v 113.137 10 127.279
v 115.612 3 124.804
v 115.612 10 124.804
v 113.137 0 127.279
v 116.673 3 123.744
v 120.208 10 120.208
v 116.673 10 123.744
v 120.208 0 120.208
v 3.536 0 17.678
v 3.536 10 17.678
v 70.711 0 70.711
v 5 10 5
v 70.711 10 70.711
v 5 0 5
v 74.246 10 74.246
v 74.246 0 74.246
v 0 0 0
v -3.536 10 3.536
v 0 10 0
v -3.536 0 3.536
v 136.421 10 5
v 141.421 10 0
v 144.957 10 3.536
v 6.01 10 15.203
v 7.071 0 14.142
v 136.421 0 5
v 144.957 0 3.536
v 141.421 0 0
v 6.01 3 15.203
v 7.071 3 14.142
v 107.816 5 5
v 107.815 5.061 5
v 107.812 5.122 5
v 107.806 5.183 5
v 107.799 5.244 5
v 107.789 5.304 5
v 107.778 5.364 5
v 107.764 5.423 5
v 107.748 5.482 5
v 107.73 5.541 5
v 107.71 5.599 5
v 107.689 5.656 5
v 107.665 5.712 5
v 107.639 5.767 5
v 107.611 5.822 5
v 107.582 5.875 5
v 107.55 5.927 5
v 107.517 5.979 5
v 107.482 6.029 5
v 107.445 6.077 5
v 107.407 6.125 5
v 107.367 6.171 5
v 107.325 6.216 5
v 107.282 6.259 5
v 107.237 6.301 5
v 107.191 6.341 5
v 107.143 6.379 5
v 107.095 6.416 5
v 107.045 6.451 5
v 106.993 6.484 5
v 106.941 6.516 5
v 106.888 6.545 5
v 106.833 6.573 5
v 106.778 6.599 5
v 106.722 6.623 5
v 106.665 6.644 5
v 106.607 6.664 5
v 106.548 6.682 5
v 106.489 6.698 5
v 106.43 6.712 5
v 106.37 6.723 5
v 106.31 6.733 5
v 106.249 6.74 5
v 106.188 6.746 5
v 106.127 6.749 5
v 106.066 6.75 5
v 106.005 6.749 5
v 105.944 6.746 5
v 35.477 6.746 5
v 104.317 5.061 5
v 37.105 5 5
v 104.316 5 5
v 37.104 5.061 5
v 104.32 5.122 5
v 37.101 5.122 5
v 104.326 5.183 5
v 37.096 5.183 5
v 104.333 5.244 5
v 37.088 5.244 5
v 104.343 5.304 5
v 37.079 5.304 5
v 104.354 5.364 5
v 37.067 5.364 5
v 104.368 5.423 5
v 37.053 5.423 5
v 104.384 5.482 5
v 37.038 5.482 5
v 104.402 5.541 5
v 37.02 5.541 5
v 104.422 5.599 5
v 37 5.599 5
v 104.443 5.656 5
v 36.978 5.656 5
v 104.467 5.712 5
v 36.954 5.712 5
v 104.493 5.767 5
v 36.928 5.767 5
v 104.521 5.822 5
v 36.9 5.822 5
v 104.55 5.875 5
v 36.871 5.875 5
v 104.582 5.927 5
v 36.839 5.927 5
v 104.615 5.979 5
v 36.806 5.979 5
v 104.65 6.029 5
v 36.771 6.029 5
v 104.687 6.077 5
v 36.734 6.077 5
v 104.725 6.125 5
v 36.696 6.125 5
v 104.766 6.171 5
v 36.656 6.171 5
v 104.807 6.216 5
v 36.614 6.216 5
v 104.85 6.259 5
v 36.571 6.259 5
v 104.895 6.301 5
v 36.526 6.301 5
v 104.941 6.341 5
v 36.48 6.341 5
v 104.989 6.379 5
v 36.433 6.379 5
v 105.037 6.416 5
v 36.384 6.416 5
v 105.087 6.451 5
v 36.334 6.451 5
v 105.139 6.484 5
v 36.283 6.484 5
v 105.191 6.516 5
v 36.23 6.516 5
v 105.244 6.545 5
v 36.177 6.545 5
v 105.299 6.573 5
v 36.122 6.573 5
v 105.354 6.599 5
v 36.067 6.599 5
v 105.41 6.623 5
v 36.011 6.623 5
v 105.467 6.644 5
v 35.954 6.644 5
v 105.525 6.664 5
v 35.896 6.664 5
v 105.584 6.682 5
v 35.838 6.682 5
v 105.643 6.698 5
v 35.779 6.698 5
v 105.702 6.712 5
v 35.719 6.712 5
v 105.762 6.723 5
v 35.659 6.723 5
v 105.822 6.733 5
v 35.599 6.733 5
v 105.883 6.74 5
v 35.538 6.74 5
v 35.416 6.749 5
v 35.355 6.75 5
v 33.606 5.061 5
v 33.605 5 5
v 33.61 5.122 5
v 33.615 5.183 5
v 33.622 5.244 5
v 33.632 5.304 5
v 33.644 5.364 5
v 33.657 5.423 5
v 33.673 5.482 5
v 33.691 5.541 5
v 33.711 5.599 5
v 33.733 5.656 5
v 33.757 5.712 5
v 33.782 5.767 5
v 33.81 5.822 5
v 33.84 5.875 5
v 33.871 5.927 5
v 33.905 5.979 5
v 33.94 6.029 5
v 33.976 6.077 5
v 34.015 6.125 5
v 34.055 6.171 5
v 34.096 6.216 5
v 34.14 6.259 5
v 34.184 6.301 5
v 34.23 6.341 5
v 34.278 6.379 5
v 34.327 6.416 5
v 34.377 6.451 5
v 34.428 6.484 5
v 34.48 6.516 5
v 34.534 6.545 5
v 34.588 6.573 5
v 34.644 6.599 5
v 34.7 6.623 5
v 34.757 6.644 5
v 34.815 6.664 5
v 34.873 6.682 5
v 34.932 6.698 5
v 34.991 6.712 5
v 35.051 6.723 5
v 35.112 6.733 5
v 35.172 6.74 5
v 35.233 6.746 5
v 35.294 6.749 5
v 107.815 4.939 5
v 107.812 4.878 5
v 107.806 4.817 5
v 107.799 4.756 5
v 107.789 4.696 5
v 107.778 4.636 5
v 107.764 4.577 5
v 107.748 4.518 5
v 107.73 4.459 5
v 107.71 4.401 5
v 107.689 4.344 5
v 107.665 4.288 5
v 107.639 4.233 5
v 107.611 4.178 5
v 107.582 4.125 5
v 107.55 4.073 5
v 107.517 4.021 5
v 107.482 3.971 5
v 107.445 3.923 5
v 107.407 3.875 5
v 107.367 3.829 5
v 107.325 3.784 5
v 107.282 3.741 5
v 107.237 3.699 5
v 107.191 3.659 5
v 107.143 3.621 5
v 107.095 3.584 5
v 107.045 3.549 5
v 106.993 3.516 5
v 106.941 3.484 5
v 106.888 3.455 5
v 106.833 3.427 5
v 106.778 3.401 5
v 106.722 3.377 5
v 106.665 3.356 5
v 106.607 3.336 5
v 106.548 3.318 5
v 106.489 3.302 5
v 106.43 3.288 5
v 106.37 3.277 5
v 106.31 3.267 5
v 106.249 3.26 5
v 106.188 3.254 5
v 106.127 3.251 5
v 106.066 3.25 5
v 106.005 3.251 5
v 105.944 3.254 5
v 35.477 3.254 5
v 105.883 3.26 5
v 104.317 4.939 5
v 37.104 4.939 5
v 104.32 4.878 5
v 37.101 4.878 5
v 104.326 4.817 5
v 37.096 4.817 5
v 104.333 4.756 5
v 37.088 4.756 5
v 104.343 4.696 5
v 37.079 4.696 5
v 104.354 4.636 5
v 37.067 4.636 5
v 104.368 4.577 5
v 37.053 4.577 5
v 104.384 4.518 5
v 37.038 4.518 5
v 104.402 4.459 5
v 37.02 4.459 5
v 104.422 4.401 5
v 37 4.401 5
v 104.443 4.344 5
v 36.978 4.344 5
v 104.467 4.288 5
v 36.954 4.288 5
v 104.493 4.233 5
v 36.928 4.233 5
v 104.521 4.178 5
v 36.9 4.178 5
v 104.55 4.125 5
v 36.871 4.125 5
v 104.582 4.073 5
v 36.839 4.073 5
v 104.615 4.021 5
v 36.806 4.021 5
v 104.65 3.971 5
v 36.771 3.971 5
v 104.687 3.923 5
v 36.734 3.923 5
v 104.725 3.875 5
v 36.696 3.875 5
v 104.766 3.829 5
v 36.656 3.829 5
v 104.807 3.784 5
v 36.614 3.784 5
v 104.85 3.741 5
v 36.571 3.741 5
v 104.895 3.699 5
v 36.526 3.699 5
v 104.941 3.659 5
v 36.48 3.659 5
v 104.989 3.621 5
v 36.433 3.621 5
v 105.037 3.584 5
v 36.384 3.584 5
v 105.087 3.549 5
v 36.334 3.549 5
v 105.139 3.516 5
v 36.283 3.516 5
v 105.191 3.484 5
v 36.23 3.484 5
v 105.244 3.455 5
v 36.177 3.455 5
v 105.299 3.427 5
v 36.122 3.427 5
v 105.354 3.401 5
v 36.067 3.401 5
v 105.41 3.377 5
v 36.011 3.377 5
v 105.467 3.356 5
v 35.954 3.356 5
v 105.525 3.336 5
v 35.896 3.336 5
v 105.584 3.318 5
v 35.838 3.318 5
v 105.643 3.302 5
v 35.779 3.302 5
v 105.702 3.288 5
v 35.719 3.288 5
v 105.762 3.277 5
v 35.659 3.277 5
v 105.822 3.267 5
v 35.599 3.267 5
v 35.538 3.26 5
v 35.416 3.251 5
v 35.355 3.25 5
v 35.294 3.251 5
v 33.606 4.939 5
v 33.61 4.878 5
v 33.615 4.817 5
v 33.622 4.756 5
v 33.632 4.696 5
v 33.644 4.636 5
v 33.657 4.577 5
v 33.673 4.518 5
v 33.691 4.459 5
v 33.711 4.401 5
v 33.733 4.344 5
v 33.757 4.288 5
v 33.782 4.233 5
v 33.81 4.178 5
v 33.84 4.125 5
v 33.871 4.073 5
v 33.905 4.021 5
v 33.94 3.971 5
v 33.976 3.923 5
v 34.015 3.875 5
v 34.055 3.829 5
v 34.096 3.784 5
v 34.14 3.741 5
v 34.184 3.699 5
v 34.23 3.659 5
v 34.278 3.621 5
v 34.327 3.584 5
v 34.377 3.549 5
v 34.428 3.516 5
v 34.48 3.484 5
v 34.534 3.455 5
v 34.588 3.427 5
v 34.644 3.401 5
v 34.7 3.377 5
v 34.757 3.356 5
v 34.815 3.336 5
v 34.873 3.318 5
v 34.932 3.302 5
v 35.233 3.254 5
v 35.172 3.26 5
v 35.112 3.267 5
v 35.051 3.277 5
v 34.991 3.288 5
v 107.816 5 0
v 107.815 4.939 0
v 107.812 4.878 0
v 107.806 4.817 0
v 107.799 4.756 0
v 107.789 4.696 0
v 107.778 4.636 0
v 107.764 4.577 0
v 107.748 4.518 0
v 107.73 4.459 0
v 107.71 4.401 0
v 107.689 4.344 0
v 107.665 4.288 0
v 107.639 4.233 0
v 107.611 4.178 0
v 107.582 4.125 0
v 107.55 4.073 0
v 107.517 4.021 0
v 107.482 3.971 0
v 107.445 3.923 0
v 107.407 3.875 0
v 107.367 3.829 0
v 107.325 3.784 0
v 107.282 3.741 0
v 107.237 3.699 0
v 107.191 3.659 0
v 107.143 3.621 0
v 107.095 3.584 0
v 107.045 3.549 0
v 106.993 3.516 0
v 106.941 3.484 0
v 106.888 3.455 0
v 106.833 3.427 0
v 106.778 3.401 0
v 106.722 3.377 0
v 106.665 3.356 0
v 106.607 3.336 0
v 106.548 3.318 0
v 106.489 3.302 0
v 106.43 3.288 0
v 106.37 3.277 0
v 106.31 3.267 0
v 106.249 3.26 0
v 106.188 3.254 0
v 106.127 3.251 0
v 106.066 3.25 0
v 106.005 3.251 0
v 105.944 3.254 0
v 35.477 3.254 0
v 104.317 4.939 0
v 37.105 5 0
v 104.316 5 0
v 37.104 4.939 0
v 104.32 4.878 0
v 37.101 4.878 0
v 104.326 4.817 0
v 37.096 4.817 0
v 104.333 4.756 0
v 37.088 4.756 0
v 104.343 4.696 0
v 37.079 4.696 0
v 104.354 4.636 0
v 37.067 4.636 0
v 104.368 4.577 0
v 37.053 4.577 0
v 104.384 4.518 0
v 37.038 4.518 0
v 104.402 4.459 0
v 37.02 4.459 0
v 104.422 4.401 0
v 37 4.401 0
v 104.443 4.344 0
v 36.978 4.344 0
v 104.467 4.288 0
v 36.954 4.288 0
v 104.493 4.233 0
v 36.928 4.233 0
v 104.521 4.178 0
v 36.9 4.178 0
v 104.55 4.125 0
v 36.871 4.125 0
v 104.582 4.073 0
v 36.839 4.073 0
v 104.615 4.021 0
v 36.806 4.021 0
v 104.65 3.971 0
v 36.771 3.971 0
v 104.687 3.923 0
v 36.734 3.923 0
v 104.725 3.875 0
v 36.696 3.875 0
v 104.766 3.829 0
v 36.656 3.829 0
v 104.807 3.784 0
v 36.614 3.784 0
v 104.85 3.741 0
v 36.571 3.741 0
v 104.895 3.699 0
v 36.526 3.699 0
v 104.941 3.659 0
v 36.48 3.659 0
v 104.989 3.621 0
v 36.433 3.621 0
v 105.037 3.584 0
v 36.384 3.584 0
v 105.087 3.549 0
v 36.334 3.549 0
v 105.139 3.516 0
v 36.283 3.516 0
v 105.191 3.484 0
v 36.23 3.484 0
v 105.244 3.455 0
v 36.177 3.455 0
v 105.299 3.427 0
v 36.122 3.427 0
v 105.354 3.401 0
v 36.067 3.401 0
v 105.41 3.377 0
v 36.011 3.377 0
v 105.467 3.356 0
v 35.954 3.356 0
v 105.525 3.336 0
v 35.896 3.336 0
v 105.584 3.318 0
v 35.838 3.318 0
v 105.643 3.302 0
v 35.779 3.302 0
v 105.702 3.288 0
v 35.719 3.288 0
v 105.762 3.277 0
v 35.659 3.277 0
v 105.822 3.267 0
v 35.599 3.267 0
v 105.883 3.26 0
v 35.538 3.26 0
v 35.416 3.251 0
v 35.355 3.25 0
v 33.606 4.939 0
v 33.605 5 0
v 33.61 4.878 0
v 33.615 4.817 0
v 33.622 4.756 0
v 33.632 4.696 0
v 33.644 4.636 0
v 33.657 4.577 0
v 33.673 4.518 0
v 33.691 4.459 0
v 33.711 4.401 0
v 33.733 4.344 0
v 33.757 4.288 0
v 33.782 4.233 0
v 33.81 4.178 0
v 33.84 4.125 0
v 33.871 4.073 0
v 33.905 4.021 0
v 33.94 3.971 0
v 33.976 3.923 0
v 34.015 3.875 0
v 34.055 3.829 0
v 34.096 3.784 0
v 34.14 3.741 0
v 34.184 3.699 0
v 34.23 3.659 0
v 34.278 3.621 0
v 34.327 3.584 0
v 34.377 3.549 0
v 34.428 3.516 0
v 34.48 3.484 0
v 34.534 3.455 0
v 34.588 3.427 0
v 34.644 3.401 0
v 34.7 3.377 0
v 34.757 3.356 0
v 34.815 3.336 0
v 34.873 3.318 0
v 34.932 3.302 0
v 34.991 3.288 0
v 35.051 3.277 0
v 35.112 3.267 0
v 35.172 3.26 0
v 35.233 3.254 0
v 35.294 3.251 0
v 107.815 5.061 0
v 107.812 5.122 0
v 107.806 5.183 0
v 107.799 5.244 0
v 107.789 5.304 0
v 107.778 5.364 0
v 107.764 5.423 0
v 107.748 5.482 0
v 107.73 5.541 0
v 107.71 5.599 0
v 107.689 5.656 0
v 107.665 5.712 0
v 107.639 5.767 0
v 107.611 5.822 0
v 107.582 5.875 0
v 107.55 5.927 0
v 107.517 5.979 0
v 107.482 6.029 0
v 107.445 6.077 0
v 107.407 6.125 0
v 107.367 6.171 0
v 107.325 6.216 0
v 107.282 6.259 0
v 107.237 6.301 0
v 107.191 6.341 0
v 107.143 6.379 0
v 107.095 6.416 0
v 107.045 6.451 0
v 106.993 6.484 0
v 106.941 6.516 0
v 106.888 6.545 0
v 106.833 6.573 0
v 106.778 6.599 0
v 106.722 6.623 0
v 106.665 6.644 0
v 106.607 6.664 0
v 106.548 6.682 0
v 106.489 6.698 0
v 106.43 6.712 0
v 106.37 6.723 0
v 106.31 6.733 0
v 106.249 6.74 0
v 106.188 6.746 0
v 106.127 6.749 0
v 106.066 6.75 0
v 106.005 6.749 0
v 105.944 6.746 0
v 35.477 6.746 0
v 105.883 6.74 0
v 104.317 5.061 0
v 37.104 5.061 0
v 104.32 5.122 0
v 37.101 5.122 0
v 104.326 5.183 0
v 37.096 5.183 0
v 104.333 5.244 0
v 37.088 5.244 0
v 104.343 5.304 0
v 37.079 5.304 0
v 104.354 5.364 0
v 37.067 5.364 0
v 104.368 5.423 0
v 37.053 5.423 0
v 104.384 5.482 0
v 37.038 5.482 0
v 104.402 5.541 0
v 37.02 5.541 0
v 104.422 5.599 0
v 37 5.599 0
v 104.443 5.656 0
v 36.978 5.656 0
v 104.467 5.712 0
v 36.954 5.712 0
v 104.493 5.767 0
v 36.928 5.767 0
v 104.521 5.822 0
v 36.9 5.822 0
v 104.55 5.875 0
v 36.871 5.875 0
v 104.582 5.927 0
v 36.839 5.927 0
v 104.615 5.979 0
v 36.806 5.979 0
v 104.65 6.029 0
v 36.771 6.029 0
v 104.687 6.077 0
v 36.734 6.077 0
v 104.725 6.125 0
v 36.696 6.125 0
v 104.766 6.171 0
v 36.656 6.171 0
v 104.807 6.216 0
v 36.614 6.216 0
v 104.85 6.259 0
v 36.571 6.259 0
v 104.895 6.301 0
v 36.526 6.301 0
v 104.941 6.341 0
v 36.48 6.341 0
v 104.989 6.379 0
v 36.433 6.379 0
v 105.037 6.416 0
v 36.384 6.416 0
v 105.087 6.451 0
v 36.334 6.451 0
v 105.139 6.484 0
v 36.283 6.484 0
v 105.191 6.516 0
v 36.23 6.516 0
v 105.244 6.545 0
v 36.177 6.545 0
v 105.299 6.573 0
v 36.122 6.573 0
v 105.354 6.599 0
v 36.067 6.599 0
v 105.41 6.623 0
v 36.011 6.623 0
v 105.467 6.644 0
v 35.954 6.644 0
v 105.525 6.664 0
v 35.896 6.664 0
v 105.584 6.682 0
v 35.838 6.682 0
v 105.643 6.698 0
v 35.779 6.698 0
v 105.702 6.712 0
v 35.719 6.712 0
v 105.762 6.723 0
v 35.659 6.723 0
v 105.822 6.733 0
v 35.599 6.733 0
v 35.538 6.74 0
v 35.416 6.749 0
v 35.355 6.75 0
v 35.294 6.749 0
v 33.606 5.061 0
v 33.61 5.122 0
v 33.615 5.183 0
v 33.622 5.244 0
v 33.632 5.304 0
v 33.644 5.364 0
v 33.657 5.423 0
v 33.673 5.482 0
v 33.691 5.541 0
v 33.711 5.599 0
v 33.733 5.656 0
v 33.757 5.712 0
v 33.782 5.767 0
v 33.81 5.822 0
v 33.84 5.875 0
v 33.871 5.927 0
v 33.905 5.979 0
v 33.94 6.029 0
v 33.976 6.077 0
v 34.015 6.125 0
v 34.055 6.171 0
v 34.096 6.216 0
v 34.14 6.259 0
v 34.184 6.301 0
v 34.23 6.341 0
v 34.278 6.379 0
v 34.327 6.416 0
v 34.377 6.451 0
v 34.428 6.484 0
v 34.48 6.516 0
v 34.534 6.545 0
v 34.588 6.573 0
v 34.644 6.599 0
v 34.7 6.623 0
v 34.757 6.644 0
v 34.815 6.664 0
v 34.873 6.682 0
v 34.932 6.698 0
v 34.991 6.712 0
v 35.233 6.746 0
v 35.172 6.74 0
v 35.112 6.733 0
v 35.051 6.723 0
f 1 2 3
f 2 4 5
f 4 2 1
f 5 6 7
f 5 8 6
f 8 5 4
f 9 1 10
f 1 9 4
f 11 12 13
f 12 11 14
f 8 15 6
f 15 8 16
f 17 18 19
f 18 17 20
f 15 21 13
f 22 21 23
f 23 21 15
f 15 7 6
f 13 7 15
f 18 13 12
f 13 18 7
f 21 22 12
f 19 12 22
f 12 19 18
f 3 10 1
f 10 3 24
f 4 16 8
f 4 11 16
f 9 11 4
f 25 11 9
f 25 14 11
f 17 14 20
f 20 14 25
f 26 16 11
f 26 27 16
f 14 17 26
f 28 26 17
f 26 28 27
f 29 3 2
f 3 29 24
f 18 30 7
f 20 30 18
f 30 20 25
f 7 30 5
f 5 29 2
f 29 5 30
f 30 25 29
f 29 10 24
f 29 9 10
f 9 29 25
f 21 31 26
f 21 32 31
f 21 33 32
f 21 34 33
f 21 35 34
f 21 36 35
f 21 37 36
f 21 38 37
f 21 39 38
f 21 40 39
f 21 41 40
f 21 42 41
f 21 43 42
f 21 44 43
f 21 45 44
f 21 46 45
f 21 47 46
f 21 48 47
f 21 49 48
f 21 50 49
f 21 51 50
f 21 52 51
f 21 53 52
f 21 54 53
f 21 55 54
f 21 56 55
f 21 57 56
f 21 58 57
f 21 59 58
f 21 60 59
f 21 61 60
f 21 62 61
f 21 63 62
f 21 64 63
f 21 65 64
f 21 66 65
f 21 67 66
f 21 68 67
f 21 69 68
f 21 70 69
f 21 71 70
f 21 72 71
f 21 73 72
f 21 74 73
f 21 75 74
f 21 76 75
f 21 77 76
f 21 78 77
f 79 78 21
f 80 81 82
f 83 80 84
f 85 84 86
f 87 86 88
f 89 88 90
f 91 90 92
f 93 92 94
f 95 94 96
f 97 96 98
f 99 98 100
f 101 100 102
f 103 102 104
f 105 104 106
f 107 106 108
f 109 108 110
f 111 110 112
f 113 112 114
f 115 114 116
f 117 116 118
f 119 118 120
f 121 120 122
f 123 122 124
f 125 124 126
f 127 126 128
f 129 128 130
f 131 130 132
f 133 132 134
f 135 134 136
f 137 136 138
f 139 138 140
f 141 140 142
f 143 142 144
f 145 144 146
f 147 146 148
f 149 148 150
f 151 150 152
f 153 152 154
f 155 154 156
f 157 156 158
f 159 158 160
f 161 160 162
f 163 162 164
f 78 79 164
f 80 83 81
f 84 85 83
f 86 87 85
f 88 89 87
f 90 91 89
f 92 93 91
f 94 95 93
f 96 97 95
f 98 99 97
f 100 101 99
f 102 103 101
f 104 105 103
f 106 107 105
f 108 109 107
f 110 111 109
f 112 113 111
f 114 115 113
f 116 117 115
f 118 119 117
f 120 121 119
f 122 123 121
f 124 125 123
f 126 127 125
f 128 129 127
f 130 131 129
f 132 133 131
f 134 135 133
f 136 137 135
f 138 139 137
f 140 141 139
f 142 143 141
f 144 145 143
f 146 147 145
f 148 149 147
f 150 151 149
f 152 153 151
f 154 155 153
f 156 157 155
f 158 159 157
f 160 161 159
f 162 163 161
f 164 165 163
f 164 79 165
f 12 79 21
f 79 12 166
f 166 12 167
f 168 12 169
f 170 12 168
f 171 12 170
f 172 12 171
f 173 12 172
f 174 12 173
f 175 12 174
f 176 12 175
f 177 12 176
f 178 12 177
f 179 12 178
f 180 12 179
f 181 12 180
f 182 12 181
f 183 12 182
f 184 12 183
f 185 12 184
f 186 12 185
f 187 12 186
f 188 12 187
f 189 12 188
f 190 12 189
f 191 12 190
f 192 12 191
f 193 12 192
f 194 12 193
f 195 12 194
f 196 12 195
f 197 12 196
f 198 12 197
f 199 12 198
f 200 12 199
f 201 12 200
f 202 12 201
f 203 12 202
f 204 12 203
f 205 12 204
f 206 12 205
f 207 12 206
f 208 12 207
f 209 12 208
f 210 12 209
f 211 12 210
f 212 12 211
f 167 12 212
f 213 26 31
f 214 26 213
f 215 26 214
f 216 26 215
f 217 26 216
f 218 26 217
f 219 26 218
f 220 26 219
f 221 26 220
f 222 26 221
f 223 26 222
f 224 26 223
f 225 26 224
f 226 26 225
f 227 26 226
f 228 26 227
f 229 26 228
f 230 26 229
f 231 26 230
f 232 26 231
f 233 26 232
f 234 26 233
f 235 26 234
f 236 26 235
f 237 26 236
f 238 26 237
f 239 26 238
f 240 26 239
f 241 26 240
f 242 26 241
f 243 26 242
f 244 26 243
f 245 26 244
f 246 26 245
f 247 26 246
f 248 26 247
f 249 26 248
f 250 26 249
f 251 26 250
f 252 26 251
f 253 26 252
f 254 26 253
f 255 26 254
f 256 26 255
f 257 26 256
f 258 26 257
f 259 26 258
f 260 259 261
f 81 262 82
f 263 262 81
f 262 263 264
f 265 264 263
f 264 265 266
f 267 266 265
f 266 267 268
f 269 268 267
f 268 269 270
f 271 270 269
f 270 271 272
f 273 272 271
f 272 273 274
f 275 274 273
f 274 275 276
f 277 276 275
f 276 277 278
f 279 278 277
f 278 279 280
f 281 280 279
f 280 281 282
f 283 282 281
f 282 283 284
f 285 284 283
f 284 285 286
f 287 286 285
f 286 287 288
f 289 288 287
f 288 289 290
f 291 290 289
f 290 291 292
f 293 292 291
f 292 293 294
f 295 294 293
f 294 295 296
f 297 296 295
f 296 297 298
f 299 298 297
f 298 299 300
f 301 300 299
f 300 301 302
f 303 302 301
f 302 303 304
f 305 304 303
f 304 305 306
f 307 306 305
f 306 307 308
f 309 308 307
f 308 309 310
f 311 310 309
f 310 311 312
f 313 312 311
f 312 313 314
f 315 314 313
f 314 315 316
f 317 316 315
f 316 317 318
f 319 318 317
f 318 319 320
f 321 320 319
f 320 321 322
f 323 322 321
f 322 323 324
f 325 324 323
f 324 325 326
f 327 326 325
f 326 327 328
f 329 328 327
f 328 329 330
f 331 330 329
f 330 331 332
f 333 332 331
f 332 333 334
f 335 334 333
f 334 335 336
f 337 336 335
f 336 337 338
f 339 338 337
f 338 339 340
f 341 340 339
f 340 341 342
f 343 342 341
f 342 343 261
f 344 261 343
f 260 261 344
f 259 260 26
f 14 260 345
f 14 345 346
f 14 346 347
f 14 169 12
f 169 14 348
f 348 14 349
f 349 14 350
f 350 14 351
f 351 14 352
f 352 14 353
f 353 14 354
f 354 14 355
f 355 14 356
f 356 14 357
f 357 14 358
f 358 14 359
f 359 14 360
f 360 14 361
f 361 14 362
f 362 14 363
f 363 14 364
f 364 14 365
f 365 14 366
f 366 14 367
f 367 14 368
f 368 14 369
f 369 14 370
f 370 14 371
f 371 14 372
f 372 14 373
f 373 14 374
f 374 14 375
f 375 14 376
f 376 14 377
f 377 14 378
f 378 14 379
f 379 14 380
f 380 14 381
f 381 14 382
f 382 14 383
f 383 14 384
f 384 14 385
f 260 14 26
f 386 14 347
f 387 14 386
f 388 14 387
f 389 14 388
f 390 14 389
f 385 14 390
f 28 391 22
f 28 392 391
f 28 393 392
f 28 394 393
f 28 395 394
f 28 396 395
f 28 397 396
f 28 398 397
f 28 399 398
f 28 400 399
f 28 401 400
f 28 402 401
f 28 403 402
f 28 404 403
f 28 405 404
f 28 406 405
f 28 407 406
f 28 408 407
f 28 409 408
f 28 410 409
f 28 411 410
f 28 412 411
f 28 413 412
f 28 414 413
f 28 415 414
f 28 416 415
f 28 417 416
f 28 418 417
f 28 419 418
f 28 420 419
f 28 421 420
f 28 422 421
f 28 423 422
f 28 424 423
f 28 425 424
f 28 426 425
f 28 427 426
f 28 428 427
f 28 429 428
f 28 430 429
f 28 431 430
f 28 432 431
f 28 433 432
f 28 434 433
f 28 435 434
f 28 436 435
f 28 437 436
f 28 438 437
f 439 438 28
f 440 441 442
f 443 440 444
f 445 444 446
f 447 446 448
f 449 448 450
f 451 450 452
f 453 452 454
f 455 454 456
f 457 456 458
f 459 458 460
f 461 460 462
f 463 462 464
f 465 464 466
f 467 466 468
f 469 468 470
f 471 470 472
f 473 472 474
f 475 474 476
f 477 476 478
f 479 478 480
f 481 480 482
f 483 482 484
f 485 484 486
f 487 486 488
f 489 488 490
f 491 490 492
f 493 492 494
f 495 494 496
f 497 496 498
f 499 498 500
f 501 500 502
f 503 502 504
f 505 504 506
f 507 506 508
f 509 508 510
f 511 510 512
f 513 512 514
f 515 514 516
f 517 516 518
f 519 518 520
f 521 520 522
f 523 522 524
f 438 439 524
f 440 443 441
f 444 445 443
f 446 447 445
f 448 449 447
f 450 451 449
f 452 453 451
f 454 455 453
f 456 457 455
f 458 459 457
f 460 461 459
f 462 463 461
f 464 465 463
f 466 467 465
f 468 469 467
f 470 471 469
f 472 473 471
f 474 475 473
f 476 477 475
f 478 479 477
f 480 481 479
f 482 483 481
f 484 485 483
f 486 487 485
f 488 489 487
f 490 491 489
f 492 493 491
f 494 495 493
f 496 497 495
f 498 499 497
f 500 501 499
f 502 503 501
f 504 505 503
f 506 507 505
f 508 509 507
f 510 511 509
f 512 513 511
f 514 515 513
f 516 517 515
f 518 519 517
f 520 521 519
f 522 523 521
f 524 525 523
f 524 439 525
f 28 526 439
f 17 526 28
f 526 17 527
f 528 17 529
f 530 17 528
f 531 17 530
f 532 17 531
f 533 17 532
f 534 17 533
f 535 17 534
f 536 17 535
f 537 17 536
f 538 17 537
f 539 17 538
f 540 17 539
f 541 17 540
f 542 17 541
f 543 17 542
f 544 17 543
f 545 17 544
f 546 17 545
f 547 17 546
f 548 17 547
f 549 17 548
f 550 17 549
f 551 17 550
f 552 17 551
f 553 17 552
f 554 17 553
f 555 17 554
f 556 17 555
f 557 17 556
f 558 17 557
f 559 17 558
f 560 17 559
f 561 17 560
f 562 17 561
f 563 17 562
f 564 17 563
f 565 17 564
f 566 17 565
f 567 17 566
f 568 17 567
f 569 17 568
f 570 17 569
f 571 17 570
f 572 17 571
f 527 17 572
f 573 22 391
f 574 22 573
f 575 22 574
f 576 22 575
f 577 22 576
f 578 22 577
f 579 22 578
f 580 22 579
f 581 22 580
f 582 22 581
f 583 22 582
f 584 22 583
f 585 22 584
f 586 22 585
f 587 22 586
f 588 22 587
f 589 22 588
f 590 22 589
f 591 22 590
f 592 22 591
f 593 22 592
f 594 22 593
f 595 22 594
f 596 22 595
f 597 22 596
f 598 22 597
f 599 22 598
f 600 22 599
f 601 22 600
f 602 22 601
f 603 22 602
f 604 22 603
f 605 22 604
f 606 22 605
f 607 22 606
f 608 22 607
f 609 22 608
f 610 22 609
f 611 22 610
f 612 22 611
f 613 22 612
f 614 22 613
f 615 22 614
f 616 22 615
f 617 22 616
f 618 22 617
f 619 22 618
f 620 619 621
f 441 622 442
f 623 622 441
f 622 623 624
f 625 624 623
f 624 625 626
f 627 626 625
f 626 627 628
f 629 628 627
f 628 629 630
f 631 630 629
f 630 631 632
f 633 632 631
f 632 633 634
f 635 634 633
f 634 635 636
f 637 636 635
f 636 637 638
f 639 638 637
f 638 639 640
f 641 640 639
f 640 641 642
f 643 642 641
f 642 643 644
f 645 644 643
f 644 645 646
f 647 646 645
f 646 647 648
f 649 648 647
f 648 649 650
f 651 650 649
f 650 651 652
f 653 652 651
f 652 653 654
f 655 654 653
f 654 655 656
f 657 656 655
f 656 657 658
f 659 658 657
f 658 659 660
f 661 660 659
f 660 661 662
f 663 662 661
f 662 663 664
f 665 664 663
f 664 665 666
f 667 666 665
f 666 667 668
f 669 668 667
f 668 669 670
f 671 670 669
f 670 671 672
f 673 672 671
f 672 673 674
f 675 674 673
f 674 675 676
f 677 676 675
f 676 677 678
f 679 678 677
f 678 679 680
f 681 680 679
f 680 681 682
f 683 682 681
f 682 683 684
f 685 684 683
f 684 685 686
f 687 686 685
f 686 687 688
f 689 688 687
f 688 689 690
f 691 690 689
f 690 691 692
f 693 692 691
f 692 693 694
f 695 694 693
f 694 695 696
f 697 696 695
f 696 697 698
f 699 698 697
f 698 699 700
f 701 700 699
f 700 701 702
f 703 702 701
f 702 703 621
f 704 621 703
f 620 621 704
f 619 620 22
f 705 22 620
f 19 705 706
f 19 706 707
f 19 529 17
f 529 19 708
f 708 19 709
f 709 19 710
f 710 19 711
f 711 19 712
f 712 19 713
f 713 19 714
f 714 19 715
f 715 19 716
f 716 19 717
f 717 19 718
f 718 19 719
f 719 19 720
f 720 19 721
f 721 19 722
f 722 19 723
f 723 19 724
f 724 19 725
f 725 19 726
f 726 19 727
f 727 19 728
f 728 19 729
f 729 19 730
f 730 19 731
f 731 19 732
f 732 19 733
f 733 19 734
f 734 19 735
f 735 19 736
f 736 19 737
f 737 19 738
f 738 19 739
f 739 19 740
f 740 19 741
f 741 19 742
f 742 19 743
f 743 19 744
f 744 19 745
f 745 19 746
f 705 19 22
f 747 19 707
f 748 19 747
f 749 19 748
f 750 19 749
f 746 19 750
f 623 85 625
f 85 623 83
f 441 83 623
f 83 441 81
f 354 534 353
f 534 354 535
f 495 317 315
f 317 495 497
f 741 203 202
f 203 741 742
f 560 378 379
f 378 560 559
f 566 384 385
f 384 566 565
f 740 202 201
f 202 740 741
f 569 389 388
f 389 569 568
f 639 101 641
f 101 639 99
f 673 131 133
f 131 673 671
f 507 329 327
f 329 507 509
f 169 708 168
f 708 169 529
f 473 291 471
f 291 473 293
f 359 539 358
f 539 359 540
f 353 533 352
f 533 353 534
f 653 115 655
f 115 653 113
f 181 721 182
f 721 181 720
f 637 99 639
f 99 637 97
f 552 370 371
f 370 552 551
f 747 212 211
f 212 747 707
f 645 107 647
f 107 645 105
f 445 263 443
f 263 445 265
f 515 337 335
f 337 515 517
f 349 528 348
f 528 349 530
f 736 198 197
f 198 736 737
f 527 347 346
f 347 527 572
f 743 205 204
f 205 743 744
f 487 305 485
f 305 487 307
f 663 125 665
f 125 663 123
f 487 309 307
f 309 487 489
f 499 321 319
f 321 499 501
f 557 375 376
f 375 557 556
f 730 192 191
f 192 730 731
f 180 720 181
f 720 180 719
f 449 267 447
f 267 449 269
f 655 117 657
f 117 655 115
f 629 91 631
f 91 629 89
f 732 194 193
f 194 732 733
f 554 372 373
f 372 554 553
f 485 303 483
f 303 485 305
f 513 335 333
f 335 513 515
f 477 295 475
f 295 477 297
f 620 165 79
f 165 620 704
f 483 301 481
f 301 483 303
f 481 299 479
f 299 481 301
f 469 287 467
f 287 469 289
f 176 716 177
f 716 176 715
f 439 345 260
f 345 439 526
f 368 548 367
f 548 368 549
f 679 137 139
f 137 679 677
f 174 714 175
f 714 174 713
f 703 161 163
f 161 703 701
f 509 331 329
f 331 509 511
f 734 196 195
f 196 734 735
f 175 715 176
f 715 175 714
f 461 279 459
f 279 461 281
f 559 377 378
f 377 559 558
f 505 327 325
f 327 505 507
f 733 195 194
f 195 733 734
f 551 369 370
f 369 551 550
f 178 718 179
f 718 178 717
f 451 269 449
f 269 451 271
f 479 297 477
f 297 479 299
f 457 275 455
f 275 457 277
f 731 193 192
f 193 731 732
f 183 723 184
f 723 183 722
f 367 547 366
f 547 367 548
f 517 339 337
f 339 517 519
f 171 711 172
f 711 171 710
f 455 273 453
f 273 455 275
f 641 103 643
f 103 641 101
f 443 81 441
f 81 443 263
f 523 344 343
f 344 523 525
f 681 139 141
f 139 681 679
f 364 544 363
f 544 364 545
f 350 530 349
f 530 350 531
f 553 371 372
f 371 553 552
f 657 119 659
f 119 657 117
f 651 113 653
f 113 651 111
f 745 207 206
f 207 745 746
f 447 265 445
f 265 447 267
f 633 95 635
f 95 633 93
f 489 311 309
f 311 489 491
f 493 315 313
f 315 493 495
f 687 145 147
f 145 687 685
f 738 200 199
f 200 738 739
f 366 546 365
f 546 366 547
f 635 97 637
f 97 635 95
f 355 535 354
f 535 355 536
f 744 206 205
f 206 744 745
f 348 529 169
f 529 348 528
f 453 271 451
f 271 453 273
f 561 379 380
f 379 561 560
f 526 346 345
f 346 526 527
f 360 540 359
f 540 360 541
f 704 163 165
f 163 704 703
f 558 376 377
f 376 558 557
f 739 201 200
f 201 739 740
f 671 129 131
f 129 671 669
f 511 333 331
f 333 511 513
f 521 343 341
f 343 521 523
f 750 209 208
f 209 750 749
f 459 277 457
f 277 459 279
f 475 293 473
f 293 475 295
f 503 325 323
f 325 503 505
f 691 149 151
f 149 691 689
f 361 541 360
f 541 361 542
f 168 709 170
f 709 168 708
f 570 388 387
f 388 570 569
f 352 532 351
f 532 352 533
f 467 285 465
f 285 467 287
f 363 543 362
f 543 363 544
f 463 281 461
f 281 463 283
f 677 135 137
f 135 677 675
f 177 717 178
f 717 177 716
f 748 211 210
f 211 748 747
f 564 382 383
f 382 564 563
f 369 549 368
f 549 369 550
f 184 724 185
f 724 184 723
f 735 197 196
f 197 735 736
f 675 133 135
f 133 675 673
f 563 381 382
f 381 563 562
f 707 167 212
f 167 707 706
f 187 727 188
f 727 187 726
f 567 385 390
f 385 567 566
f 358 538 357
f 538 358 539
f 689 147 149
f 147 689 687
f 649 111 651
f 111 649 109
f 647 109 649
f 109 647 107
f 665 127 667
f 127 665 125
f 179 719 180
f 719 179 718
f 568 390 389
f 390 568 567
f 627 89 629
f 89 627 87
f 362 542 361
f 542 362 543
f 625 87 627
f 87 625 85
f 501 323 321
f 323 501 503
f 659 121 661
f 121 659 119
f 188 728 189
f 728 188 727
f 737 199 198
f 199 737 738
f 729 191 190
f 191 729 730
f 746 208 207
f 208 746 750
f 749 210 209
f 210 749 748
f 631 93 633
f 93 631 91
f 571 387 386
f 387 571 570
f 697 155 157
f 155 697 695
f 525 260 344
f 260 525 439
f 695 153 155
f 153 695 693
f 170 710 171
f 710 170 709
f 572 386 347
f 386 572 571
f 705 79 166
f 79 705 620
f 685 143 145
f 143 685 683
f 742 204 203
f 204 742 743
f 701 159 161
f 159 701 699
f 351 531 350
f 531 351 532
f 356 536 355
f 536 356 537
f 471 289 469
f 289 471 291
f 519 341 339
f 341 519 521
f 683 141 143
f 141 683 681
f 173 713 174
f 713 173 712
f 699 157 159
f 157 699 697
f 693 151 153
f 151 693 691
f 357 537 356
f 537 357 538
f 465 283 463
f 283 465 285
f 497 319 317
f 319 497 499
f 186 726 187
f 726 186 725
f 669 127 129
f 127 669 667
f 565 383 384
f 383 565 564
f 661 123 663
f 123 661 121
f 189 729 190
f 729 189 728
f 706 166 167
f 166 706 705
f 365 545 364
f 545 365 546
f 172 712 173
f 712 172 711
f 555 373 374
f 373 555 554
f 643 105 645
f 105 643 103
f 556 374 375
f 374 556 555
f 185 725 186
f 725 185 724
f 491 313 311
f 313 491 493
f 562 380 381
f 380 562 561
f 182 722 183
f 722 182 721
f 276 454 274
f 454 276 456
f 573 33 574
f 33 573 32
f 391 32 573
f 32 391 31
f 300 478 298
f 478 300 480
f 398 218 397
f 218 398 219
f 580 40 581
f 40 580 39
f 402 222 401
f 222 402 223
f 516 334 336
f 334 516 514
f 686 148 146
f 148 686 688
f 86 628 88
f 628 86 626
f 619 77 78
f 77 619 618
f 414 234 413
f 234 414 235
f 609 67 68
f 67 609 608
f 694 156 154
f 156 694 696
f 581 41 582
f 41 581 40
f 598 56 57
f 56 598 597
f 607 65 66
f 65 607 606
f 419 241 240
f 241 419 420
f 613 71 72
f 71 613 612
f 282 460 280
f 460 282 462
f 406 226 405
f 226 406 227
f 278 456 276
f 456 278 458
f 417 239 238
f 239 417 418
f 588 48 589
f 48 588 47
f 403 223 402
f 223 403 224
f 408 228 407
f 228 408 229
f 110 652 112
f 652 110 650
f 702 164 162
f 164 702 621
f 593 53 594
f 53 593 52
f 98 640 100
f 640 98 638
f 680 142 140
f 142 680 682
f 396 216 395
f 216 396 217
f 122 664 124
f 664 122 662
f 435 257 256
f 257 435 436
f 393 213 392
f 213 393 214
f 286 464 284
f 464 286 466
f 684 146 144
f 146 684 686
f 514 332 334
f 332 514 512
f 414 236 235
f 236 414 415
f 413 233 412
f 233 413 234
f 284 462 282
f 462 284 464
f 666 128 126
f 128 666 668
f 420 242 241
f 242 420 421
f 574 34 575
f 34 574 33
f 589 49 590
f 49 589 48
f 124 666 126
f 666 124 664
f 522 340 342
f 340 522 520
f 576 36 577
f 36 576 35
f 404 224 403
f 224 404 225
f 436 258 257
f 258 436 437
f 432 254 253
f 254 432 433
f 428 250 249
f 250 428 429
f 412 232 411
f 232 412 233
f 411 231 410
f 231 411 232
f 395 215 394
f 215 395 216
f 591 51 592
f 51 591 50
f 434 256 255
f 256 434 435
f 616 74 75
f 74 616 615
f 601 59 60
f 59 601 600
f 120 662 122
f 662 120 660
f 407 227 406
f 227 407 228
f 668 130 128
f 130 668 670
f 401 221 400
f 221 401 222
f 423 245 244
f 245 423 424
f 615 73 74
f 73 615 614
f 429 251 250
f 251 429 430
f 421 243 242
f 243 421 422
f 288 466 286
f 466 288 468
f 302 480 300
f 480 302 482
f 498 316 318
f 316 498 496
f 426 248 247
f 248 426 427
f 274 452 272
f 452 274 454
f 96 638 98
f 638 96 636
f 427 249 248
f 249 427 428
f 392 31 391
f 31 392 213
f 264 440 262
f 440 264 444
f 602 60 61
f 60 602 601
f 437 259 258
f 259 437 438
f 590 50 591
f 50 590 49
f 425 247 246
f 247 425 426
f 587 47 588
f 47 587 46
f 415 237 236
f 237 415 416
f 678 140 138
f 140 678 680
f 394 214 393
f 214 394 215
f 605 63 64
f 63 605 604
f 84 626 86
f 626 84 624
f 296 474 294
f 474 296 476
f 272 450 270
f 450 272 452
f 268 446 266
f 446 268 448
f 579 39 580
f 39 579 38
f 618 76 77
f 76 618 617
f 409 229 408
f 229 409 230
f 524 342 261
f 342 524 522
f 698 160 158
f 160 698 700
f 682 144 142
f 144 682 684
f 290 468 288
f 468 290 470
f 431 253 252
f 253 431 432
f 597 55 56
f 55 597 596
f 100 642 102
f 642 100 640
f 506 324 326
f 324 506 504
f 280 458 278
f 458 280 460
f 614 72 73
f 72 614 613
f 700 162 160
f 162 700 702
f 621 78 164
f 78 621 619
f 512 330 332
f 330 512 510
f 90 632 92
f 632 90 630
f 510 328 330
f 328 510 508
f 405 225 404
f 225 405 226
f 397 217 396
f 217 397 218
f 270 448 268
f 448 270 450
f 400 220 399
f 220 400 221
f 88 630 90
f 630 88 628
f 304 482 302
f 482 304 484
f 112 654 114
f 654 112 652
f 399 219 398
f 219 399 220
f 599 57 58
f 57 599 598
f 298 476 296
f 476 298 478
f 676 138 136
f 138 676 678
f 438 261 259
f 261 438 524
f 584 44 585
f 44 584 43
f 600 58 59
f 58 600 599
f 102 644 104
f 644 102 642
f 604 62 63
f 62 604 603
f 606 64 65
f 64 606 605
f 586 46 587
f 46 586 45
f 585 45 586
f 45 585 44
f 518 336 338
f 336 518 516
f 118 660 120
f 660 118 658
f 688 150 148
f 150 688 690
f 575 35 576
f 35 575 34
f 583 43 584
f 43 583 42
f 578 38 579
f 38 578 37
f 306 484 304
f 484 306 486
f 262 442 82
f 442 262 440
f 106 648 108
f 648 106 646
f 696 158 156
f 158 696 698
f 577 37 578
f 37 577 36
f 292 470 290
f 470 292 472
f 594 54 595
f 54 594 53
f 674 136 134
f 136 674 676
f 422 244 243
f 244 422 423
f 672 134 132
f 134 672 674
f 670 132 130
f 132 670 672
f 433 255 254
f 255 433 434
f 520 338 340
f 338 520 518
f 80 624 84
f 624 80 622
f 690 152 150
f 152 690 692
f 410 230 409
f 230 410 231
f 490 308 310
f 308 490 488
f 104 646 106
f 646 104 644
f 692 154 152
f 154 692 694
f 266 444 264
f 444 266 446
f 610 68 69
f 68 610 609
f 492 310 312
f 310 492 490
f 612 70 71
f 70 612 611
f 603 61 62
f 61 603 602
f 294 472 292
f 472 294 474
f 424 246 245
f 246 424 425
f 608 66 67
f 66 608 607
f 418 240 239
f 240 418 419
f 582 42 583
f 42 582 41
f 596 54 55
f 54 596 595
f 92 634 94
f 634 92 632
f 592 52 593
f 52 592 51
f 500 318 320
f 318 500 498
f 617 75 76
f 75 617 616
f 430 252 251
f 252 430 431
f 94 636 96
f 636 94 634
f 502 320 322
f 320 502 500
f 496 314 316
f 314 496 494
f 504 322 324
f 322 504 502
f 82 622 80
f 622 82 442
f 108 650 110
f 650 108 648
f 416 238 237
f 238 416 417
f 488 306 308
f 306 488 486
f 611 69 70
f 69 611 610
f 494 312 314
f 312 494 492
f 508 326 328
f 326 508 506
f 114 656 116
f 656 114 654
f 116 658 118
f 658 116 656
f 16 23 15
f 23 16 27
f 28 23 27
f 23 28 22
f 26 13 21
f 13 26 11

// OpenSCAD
// Panel length (mm)
length = 155;

// Panel frame depth (mm)
frame = 15;

// Support bar position (mm)
barPos =100;

// Panel angle (max 55 degrees)
angle = 45;

// Channel witdh
channel = 1.5;

// Screw hole diameter (mm)
diameter = 3.5;

// Mirror model?
mirror = 0;

module solarBracket(){
    if(mirror == 0){
        Bracket();
    } else {
       translate([0,-50,0]){
            mirror([0,1,0])
                    Bracket();
        }
    }
}solarBracket();

module Bracket(){
    a =tan(angle)*barPos;                  // support lenght
    h = sqrt(pow(barPos,2)+pow(a,2));     // Base lenght
    difference(){
        rotate([0,-angle,0]){
            difference(){
                cube([length+frame,10,10]);       
                
                translate([0,3,5])
                    cube([length+frame,17,channel]);
                
                translate([0,0,5])
                    cube([frame,10,10]);
            }
           
            translate([barPos,0,-a])
                cube([5,10,a]);
            
            rotate([0,angle,0]){
                difference(){
                    cube([h,10,5]);
                    
                    spacing = h/4;
                    translate([spacing,5,0])
                         cylinder(h=10, d=diameter,$fn=180);
                    
                    translate([3*spacing,5,0])
                        cylinder(h=10, d=diameter,$fn=180);
                }
            }
        }
        translate([20,20,0])
            cube([20,20,20]);
    }
}
